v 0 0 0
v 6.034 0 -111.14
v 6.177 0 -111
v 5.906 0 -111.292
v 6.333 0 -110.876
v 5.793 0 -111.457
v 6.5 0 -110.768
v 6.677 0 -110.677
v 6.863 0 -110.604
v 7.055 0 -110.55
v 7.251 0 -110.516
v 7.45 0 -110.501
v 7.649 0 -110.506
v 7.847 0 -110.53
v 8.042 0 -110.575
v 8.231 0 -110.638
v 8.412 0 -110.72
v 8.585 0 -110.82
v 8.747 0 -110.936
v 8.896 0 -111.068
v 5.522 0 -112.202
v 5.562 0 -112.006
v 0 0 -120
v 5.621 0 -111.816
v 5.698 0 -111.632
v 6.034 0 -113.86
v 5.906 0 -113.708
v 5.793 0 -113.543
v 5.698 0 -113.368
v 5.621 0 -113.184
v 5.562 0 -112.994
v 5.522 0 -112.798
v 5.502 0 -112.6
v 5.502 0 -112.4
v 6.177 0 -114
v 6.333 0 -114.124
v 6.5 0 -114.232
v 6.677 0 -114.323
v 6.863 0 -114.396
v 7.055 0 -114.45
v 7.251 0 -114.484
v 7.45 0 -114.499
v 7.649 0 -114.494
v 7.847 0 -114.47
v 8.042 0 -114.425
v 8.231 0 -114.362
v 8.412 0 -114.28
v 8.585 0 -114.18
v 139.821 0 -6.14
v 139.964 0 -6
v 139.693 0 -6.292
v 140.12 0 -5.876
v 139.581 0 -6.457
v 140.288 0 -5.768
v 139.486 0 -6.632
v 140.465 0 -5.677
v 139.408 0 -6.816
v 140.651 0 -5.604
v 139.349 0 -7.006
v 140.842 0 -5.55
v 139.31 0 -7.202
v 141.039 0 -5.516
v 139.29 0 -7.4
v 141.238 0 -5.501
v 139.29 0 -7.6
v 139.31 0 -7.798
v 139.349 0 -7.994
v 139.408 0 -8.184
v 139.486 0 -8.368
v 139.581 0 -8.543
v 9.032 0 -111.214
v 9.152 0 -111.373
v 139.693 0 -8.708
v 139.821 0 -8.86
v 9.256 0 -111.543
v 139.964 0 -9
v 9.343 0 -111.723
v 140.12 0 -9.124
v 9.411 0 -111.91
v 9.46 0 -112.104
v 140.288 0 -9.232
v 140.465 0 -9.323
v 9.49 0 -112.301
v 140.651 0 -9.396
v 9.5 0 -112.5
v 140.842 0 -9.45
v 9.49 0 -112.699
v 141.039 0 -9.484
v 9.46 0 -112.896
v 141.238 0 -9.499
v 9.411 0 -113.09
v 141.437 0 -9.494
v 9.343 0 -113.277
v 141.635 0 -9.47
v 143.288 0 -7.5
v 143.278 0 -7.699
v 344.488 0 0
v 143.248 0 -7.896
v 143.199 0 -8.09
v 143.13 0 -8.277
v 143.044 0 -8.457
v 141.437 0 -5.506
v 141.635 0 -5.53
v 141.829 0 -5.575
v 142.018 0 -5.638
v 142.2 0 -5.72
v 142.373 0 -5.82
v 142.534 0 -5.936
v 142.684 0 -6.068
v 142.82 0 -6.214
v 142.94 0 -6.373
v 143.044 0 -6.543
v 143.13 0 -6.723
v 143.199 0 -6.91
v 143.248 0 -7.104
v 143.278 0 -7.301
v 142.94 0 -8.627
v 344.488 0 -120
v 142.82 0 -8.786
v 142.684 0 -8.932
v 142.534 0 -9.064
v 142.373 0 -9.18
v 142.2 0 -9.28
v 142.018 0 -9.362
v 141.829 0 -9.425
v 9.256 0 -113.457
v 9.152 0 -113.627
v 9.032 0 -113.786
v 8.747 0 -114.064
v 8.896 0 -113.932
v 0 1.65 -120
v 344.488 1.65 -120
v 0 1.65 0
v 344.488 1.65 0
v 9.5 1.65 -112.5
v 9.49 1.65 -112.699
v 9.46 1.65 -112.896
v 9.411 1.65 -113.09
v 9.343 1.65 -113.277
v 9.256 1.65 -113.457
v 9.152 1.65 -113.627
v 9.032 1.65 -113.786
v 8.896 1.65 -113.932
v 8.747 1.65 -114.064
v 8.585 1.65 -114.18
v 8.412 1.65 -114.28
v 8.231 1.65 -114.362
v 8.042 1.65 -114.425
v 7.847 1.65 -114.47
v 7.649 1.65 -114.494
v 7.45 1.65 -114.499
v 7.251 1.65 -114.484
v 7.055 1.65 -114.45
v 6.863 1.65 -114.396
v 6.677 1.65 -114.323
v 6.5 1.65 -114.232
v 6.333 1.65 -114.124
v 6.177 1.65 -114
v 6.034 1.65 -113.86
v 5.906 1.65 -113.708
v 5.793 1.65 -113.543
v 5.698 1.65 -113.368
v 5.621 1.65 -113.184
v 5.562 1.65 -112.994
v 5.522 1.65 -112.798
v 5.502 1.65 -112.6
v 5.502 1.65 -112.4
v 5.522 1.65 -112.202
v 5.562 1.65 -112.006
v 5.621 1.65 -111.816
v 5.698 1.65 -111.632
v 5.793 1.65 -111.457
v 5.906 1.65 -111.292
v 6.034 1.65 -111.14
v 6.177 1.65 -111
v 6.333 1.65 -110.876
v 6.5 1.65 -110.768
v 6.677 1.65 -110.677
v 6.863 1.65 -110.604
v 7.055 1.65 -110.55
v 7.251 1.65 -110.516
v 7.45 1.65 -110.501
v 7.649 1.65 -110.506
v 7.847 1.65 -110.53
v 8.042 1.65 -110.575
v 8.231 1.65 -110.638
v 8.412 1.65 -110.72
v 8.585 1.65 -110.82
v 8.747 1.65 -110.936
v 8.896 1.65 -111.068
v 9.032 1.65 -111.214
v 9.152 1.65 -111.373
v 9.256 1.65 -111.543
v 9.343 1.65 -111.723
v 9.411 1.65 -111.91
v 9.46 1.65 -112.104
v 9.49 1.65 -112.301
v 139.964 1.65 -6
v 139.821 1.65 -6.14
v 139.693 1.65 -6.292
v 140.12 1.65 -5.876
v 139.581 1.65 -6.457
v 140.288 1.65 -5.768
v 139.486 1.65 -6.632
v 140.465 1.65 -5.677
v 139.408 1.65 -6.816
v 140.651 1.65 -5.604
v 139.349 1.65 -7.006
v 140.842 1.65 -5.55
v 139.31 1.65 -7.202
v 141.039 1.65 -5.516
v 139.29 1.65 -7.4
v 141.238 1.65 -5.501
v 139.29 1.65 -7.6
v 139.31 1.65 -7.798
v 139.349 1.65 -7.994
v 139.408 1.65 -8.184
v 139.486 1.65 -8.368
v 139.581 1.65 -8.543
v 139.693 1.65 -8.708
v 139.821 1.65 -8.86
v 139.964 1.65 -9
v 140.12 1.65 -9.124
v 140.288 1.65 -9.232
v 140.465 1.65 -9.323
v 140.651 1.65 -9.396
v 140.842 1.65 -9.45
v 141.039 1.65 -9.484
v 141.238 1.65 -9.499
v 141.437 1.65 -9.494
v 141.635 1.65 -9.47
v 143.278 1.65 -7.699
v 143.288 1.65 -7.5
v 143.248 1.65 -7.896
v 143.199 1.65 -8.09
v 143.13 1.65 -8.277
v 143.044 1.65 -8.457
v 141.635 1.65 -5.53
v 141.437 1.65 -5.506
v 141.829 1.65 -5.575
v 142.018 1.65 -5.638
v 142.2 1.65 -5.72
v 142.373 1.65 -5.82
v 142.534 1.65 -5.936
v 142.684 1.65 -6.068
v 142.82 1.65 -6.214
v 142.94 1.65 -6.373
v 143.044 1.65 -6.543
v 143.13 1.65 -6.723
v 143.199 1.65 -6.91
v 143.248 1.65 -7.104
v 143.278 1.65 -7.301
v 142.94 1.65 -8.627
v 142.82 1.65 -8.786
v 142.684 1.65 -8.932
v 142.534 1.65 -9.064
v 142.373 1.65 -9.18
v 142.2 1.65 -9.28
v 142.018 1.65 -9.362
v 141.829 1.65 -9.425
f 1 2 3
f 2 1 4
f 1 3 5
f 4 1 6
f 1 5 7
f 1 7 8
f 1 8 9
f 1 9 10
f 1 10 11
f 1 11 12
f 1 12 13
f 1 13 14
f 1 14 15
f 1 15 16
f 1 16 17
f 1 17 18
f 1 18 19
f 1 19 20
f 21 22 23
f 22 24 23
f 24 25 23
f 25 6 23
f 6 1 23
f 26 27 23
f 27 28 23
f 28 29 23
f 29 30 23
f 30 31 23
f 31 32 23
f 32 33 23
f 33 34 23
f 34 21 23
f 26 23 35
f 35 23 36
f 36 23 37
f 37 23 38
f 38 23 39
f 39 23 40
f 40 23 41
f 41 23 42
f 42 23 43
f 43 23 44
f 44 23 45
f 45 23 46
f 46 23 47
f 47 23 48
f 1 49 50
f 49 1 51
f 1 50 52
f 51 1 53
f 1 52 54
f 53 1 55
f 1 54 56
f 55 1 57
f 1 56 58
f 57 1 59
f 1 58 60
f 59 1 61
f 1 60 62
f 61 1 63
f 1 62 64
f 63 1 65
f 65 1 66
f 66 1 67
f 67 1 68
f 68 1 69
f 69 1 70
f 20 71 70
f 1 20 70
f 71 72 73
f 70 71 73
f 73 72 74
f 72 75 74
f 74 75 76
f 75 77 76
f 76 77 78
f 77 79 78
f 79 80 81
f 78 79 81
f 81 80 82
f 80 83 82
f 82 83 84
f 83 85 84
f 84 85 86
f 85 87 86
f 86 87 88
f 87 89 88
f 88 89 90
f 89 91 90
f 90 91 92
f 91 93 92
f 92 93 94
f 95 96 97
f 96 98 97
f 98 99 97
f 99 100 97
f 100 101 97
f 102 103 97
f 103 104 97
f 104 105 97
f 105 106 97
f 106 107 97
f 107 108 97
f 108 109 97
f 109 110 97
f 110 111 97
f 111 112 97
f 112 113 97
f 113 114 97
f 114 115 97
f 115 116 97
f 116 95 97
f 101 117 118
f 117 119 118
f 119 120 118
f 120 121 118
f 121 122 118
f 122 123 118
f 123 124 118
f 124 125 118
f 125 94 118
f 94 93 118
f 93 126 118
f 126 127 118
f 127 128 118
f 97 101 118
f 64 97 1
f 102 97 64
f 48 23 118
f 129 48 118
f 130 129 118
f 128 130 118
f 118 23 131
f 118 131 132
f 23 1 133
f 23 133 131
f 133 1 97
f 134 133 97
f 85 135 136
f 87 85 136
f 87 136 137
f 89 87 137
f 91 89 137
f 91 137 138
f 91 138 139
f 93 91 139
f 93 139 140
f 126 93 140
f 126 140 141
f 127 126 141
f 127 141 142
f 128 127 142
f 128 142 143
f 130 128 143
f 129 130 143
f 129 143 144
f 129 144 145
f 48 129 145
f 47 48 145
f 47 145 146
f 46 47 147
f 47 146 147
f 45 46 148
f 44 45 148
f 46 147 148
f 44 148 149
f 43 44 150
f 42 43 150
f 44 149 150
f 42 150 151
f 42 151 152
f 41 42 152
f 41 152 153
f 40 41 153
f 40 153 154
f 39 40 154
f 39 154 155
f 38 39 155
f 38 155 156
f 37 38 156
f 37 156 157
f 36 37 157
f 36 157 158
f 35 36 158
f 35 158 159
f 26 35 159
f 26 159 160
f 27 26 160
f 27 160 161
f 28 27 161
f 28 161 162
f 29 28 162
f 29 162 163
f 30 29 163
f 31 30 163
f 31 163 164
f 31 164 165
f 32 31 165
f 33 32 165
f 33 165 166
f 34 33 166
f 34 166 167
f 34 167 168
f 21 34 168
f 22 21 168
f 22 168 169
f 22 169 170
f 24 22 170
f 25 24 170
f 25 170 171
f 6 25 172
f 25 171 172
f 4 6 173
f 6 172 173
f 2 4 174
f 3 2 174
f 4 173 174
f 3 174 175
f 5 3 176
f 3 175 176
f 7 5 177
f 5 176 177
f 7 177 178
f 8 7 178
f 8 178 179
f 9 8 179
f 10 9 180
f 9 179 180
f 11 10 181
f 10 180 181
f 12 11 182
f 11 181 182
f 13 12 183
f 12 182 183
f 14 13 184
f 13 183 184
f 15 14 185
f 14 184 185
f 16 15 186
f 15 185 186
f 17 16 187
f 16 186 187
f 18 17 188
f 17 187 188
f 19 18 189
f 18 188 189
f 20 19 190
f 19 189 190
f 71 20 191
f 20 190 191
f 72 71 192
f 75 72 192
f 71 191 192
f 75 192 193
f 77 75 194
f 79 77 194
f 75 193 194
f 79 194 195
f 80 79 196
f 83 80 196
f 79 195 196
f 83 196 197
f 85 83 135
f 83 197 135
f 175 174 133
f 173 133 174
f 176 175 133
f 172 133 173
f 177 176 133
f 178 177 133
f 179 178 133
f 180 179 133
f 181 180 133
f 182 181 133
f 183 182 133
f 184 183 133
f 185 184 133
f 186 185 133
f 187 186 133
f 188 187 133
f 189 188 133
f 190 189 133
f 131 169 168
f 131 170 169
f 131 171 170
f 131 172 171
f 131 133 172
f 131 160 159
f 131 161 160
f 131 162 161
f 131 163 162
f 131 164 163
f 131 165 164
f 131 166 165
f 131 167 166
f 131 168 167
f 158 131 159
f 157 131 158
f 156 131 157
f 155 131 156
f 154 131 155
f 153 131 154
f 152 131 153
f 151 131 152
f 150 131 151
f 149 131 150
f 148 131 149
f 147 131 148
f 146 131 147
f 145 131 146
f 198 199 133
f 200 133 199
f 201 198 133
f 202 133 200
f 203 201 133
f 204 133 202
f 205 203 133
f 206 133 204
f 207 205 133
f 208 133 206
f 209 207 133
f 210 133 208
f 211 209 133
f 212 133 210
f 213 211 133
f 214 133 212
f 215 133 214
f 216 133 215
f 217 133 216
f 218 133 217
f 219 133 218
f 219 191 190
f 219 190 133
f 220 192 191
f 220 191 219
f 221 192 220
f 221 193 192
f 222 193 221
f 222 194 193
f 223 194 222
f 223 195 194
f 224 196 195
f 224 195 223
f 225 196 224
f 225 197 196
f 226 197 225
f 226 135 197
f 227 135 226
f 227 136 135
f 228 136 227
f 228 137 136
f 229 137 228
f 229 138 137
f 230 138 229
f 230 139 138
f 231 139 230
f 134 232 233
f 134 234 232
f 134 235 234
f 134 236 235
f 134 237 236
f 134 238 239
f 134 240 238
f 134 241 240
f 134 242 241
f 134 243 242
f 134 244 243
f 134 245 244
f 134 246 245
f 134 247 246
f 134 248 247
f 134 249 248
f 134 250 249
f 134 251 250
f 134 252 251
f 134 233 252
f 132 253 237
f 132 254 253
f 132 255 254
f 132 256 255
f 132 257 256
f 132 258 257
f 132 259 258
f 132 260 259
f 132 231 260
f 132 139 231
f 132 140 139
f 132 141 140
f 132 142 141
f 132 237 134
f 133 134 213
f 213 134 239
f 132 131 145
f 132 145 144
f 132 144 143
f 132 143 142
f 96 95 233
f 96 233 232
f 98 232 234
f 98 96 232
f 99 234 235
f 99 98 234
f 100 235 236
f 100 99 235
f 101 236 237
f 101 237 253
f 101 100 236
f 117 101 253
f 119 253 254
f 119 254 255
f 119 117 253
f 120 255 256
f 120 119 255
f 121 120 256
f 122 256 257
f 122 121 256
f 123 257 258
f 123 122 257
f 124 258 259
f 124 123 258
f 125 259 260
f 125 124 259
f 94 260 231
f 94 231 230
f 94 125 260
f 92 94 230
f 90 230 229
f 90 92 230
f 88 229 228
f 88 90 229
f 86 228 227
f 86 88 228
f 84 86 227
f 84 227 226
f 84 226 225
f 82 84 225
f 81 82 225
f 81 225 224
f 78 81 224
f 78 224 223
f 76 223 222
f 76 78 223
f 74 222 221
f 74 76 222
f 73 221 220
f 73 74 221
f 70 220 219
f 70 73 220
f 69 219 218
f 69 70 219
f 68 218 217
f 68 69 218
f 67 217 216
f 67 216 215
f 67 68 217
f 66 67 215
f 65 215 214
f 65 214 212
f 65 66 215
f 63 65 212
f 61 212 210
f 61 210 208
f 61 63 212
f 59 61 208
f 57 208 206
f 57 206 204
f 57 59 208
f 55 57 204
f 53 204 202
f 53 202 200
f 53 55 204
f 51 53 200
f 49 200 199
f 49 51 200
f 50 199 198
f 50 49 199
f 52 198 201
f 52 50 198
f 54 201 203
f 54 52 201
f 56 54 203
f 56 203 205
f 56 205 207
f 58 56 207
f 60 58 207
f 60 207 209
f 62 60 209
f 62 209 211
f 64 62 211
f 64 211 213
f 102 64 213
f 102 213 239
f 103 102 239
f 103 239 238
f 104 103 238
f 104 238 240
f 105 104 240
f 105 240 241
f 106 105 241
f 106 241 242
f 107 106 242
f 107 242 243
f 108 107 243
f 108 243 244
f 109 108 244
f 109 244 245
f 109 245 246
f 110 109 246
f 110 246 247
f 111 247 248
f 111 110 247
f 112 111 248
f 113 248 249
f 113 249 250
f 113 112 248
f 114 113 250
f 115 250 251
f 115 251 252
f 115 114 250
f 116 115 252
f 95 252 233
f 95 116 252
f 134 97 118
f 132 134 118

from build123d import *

# Parameters (mm, degrees)
SKETCH1_W           = 344.4875
SKETCH1_H           = 120
SKETCH1_R           = 2
BOSS_EXTRUDE1_DEPTH = 1.65
SKETCH2_R           = 2
CUT_EXTRUDE1_DEPTH  = 10


with BuildPart() as part:
    # Sketch1 → Boss-Extrude1 (new body)
    with BuildSketch(Plane(origin=(0, 0, 0), x_dir=(1, 0, 0), z_dir=(0, 1, 0))):
        with Locations((172.24375, 60)):
            Rectangle(SKETCH1_W, SKETCH1_H)
        with Locations((141.2875, 7.5)):
            Circle(SKETCH1_R, mode=Mode.SUBTRACT)
    extrude(amount=BOSS_EXTRUDE1_DEPTH)

    # Sketch2 → Cut-Extrude1 (cut)
    with BuildSketch(Plane(origin=(0, 1.65, 0), x_dir=(1, 0, 0), z_dir=(0, 1, 0))):
        with Locations((7.5, 112.5)):
            Circle(SKETCH2_R)
    extrude(amount=-CUT_EXTRUDE1_DEPTH, mode=Mode.SUBTRACT)


solid = part.part
